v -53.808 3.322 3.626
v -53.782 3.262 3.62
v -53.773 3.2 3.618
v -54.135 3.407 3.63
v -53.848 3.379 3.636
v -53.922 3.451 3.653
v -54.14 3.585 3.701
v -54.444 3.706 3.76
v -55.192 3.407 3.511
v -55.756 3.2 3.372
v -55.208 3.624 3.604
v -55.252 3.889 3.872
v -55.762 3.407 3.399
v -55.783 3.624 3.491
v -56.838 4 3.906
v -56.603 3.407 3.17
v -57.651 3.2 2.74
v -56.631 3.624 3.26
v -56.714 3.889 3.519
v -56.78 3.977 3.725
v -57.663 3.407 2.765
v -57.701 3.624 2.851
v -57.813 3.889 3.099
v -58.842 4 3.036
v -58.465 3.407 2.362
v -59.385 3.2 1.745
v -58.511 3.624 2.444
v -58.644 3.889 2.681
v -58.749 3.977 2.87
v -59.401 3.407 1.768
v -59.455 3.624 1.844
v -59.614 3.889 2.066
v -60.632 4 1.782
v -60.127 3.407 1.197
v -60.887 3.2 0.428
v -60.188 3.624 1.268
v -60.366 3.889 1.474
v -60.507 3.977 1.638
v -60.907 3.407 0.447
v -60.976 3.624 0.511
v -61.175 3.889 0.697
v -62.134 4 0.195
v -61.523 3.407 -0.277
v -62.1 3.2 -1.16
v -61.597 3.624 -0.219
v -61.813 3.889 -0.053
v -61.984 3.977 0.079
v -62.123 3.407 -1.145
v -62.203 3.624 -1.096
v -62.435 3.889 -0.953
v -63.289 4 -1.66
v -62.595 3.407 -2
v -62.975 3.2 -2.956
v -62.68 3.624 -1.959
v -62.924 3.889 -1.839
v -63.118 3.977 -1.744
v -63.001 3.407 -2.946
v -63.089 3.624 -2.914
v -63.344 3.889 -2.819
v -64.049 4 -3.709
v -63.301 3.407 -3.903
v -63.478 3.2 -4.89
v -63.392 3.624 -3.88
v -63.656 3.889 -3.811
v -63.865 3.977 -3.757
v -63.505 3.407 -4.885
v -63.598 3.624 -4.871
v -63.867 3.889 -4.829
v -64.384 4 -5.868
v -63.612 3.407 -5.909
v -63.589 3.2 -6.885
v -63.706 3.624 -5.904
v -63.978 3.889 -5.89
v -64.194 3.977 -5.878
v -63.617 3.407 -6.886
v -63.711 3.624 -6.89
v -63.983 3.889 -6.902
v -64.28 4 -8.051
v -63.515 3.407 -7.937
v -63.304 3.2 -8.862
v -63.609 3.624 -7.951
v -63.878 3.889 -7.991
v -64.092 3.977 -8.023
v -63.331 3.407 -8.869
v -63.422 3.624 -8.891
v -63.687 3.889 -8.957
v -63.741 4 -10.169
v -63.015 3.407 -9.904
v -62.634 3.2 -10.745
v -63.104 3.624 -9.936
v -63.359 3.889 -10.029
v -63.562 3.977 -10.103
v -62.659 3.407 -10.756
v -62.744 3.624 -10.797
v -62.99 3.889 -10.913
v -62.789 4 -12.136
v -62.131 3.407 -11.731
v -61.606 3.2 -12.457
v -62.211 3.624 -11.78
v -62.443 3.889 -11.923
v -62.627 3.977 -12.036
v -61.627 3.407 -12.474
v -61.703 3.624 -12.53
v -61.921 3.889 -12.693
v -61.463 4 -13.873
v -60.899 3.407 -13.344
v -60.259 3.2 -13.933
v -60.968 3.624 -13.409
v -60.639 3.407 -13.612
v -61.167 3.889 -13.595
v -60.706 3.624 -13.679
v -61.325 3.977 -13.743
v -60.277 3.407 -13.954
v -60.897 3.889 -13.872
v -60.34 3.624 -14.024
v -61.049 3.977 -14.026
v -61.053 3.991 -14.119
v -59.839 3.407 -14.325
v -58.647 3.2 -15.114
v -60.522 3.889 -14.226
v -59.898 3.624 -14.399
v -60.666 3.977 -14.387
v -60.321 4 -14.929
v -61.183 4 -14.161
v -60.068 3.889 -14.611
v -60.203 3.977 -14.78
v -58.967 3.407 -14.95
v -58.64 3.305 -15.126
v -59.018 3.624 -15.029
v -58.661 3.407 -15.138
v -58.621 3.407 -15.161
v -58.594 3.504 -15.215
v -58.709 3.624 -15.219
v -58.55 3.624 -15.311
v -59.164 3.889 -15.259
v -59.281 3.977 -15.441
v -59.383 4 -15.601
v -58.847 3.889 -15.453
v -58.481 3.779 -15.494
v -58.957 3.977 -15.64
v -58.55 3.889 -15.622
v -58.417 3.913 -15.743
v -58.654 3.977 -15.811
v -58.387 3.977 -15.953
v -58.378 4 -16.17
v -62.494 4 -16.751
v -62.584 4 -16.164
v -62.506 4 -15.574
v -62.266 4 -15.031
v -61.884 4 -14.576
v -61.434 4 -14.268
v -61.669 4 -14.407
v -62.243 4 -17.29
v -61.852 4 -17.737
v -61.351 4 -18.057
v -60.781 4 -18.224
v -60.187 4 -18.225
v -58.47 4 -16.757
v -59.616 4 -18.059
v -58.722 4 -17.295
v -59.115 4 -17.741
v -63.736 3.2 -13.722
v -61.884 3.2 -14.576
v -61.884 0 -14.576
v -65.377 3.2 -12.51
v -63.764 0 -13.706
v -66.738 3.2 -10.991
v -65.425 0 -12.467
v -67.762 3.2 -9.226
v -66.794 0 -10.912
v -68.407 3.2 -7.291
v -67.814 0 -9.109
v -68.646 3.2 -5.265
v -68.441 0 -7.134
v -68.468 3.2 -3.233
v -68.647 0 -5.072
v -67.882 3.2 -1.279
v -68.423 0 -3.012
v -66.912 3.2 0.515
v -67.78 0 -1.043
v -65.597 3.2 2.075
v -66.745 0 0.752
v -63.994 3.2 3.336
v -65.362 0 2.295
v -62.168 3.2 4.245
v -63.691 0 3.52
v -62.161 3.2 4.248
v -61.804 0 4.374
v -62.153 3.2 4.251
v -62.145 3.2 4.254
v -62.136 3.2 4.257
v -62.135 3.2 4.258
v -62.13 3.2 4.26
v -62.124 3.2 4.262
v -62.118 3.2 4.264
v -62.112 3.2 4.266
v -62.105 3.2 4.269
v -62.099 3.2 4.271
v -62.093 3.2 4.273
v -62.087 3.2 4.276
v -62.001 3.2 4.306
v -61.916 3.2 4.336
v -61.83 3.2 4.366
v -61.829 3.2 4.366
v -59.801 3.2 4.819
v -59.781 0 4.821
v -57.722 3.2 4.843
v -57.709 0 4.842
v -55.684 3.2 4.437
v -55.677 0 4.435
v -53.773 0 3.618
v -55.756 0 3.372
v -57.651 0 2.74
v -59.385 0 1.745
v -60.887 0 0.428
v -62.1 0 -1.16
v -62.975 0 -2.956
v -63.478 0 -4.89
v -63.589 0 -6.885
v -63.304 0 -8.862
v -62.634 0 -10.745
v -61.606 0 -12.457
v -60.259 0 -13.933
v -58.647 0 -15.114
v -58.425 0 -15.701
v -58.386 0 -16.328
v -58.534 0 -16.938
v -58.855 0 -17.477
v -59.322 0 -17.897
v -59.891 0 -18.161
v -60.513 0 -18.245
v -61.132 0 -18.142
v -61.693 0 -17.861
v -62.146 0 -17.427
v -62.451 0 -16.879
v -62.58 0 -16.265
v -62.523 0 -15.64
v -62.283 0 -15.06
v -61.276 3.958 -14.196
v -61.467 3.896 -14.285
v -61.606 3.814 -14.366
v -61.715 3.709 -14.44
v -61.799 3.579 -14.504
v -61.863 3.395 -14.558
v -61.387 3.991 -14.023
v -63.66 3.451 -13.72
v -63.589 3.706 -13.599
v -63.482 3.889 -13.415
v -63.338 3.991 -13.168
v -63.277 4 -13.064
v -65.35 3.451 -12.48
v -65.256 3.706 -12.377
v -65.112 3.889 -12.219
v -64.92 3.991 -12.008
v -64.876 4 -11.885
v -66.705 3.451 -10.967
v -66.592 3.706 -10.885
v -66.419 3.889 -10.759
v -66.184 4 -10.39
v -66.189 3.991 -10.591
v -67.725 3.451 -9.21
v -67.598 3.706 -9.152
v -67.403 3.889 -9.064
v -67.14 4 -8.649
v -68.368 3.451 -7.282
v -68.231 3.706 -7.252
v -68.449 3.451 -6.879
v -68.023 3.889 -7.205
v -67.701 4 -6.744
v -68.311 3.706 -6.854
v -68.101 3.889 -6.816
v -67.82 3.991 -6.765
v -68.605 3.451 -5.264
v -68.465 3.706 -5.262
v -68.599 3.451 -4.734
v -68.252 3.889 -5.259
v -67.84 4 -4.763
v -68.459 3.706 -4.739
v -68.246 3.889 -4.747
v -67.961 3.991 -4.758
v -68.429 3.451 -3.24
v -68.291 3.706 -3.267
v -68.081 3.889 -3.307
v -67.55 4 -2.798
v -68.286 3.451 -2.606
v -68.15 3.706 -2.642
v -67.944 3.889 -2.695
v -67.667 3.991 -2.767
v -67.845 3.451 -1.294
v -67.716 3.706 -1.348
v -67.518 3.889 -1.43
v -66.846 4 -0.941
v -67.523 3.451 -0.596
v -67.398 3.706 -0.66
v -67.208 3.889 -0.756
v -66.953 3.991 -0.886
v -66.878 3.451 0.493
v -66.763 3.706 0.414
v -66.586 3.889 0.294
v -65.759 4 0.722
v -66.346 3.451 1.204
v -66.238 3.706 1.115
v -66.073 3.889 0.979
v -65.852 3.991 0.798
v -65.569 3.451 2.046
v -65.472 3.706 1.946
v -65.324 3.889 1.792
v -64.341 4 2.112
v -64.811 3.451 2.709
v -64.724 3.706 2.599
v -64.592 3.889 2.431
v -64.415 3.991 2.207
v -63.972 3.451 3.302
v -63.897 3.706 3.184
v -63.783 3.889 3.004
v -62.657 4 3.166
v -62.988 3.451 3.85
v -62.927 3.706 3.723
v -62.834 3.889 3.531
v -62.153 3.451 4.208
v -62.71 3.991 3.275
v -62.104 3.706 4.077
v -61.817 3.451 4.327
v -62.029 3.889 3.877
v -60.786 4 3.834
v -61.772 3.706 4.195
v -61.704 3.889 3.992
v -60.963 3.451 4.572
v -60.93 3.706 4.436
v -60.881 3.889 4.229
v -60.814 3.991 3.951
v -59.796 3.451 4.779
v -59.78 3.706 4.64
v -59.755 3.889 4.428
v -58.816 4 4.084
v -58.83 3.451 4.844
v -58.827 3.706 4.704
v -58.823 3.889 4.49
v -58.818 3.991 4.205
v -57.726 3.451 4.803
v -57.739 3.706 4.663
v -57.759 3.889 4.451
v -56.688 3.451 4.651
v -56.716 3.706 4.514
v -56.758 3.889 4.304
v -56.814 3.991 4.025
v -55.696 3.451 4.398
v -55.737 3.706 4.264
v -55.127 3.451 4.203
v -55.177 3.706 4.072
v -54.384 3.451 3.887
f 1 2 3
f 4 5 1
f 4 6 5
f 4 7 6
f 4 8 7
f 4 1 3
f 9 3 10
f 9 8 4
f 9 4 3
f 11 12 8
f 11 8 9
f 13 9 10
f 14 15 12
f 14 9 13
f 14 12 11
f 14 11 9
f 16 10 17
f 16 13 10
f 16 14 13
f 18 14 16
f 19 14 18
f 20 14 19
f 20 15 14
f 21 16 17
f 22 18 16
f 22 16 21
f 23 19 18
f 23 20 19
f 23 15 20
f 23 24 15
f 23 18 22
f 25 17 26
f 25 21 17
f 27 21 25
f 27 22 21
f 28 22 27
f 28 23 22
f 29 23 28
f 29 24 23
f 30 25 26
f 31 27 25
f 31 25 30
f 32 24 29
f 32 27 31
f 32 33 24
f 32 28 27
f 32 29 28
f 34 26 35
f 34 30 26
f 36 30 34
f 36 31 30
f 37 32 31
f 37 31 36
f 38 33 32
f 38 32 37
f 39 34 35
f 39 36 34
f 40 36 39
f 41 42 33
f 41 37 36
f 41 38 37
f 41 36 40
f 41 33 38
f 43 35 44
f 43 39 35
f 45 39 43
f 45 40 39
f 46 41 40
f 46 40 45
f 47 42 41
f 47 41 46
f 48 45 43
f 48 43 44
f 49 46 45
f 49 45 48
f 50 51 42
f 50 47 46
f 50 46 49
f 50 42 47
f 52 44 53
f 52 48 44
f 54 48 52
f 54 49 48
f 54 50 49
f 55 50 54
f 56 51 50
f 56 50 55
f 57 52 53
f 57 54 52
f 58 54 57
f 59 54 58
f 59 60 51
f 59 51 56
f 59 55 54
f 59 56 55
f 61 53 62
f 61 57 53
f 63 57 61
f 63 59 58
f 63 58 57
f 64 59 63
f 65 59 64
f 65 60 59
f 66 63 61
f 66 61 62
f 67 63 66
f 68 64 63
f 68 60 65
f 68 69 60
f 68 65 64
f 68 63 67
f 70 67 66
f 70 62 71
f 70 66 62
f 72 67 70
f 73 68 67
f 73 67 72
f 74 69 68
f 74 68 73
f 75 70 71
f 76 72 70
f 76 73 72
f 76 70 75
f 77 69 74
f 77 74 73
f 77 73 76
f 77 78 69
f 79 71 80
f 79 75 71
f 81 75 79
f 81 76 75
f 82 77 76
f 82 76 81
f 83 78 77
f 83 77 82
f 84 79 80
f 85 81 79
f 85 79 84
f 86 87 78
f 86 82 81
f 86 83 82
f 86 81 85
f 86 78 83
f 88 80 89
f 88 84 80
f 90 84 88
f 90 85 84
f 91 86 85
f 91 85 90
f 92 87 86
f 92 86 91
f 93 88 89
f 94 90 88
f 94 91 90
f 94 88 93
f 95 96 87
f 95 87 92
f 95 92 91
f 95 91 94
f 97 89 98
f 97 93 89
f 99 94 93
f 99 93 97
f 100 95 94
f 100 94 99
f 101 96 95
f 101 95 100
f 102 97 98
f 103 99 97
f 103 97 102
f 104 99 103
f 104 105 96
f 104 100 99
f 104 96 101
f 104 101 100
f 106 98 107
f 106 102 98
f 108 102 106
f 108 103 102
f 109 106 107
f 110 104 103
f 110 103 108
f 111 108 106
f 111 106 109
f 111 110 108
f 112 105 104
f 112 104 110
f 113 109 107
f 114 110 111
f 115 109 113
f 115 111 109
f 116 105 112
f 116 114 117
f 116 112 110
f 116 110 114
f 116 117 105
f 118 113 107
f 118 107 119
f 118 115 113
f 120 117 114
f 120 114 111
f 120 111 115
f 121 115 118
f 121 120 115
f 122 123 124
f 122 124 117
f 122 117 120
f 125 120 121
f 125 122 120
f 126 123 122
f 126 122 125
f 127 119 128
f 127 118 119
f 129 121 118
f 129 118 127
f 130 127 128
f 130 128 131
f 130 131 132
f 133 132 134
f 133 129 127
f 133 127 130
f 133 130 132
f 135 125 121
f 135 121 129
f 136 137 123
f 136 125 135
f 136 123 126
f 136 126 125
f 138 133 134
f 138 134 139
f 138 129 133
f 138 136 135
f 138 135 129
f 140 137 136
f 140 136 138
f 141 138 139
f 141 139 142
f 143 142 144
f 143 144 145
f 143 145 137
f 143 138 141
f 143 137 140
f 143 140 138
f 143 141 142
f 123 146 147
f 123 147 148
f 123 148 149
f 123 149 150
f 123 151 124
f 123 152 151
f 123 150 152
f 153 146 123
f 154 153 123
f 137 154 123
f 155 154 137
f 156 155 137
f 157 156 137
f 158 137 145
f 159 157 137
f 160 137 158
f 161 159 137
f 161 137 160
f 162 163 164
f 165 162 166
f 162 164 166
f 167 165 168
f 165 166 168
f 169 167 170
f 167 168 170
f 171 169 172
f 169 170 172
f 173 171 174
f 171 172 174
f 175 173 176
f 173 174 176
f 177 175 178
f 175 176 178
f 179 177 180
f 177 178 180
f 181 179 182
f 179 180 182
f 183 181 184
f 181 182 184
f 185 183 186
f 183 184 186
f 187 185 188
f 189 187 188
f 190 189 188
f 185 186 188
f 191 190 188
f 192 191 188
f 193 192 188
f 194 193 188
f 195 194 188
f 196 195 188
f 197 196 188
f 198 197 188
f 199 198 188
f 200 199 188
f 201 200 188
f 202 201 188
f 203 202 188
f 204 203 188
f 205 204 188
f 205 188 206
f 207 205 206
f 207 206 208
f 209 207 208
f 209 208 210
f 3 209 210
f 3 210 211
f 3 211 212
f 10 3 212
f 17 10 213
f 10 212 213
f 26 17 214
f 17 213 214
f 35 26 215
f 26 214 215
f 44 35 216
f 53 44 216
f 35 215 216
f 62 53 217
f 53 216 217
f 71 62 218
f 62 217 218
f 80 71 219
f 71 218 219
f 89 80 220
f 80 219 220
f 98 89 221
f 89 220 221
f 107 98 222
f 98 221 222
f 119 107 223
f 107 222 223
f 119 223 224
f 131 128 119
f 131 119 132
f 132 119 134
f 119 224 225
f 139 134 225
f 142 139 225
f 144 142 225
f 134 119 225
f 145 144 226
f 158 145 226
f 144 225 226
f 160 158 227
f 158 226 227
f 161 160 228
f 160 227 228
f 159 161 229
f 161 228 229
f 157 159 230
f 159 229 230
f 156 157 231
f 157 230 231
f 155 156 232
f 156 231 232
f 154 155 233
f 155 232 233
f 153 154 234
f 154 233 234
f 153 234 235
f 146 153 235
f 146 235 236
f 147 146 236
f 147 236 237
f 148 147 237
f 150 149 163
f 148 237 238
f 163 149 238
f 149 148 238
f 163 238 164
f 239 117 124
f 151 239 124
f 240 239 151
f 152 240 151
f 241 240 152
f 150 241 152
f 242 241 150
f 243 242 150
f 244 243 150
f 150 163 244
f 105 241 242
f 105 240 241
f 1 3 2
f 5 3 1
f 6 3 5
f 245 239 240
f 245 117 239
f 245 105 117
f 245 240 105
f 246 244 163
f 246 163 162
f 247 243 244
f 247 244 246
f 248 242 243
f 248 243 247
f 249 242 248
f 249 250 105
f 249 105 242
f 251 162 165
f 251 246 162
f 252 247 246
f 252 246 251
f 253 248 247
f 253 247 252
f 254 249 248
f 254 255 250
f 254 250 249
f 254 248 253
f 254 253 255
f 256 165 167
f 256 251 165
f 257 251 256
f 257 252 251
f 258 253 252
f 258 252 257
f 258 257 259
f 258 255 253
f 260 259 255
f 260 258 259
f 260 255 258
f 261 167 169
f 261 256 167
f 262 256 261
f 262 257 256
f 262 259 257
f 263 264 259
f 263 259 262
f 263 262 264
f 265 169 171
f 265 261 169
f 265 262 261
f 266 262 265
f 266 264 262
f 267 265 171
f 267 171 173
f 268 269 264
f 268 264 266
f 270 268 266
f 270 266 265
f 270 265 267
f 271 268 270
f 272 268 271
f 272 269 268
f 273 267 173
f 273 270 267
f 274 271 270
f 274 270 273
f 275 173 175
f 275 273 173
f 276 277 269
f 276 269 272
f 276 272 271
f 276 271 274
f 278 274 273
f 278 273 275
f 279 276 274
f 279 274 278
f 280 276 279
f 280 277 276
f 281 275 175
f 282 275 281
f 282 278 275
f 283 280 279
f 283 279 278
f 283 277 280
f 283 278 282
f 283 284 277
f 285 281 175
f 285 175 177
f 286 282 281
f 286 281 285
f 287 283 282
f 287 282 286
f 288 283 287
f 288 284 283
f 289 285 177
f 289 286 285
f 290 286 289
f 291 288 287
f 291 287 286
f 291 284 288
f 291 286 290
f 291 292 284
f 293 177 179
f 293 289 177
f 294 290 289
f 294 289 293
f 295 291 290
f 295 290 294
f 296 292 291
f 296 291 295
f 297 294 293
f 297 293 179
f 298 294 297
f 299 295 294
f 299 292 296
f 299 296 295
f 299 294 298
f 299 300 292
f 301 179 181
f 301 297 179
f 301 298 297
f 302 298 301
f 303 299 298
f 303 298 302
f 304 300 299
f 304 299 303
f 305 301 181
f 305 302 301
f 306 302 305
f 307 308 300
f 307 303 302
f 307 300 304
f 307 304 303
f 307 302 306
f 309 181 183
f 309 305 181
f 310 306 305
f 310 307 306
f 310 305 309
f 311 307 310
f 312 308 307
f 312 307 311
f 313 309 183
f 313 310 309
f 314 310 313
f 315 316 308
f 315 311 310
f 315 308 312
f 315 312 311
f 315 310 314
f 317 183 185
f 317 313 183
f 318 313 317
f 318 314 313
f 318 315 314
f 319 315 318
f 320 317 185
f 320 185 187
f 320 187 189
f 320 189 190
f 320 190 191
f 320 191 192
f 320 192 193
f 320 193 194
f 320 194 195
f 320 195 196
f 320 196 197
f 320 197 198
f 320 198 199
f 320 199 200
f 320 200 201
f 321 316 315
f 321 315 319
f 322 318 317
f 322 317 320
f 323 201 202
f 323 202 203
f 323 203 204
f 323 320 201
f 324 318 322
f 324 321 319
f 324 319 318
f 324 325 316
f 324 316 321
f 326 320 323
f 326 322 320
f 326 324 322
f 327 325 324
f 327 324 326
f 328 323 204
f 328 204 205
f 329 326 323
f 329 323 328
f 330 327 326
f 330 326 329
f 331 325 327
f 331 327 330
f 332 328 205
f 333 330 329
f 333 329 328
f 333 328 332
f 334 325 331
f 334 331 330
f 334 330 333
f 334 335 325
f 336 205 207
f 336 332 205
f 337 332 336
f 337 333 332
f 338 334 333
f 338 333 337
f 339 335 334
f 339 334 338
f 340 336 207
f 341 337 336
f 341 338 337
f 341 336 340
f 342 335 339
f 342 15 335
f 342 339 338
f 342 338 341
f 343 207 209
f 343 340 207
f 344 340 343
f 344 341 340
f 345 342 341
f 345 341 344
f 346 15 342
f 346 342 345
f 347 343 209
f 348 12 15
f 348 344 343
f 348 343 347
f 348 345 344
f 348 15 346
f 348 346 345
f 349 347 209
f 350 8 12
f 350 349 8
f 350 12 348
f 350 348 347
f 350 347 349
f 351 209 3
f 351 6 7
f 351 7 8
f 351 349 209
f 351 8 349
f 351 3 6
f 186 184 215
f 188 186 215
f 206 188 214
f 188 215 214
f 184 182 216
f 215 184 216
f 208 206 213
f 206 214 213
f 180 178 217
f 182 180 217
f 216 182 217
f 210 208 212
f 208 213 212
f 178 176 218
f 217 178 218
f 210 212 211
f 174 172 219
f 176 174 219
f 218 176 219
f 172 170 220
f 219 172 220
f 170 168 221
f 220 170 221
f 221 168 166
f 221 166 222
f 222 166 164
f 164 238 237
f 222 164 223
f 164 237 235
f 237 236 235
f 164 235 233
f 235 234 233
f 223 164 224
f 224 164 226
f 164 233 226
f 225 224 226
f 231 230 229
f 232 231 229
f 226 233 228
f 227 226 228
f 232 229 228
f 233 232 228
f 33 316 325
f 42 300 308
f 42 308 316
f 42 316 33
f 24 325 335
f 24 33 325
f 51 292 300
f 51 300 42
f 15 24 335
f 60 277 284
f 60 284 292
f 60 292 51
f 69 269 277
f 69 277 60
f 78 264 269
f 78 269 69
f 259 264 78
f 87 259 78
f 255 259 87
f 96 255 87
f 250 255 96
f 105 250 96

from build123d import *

# Parameters (mm, degrees)
SALIENTE_EXTRUIR1_DEPTH = 4
REDONDEO6_R             = 0.8


with BuildPart() as part:
    # Croquis1 → Saliente-Extruir1 (new body)
    with BuildSketch(Plane(origin=(0, 0, 0), x_dir=(1, 0, 0), z_dir=(0, 1, 0))):
        with BuildLine():
            ThreePointArc((-61.883639125, 14.575898233), (-67.780374095, 1.042618708), (-53.773153629, -3.61773673))
            ThreePointArc((-53.773153629, -3.61773673), (-63.274753441, 3.910149301), (-58.646815221, 15.11424029))
            ThreePointArc((-58.646815221, 15.11424029), (-60.82603012, 18.216941024), (-61.883639125, 14.575898233))
        make_face()
    extrude(amount=SALIENTE_EXTRUIR1_DEPTH)

    # Redondeo6
    # the kernel refuses this fillet: 0.8 mm, written as the material it takes off along each edge
    with BuildSketch(Plane(origin=(-53.533974817, 4, -6.444492505), x_dir=(0.17426350002173693, 0, 0.9846990568494387), z_dir=(0.9846990568494387, 0, -0.17426350002173693))) as redondeo6_piece_1:
        with BuildLine():
            CenterArc((10.065071469 + REDONDEO6_R, REDONDEO6_R), REDONDEO6_R, 180, 90)
            Line((10.065071469 + REDONDEO6_R, 0), (10.065071469, 0))
            Line((10.065071469, 0), (10.065071469, REDONDEO6_R))
        make_face()
    revolve(axis=Axis((-53.533974817, 4, -6.444492505), (0, -1, 0)), revolution_arc=170.903989059, mode=Mode.SUBTRACT)
    with BuildSketch(Plane(origin=(-58.646815221, 4, -5.11424029), x_dir=(-0.12889969509175428, 0, -0.9916576367906682), z_dir=(0.9916576367906682, 0, -0.12889969509175428))) as redondeo6_piece_2_section:
        with BuildLine():
            CenterArc((10 - REDONDEO6_R, -REDONDEO6_R), REDONDEO6_R, 0, 90)
            Line((10 - REDONDEO6_R, 0), (10, 0))
            Line((10, 0), (10, -REDONDEO6_R))
        make_face()
    redondeo6_piece_2 = revolve(axis=Axis((-58.646815221, 4, -5.11424029), (0, 1, 0)), revolution_arc=213.241351406, mode=Mode.PRIVATE)
    redondeo6_piece_2 = redondeo6_piece_2 - Plane(origin=(-60.481031052, 3.778290137, -16.142607032), x_dir=(0.8722614376655369, 0, 0.48903985968594704), z_dir=(0, -1, 0)) * Cylinder(2.102828064, 41, mode=Mode.PRIVATE)
    add(redondeo6_piece_2, mode=Mode.SUBTRACT)


solid = part.part
